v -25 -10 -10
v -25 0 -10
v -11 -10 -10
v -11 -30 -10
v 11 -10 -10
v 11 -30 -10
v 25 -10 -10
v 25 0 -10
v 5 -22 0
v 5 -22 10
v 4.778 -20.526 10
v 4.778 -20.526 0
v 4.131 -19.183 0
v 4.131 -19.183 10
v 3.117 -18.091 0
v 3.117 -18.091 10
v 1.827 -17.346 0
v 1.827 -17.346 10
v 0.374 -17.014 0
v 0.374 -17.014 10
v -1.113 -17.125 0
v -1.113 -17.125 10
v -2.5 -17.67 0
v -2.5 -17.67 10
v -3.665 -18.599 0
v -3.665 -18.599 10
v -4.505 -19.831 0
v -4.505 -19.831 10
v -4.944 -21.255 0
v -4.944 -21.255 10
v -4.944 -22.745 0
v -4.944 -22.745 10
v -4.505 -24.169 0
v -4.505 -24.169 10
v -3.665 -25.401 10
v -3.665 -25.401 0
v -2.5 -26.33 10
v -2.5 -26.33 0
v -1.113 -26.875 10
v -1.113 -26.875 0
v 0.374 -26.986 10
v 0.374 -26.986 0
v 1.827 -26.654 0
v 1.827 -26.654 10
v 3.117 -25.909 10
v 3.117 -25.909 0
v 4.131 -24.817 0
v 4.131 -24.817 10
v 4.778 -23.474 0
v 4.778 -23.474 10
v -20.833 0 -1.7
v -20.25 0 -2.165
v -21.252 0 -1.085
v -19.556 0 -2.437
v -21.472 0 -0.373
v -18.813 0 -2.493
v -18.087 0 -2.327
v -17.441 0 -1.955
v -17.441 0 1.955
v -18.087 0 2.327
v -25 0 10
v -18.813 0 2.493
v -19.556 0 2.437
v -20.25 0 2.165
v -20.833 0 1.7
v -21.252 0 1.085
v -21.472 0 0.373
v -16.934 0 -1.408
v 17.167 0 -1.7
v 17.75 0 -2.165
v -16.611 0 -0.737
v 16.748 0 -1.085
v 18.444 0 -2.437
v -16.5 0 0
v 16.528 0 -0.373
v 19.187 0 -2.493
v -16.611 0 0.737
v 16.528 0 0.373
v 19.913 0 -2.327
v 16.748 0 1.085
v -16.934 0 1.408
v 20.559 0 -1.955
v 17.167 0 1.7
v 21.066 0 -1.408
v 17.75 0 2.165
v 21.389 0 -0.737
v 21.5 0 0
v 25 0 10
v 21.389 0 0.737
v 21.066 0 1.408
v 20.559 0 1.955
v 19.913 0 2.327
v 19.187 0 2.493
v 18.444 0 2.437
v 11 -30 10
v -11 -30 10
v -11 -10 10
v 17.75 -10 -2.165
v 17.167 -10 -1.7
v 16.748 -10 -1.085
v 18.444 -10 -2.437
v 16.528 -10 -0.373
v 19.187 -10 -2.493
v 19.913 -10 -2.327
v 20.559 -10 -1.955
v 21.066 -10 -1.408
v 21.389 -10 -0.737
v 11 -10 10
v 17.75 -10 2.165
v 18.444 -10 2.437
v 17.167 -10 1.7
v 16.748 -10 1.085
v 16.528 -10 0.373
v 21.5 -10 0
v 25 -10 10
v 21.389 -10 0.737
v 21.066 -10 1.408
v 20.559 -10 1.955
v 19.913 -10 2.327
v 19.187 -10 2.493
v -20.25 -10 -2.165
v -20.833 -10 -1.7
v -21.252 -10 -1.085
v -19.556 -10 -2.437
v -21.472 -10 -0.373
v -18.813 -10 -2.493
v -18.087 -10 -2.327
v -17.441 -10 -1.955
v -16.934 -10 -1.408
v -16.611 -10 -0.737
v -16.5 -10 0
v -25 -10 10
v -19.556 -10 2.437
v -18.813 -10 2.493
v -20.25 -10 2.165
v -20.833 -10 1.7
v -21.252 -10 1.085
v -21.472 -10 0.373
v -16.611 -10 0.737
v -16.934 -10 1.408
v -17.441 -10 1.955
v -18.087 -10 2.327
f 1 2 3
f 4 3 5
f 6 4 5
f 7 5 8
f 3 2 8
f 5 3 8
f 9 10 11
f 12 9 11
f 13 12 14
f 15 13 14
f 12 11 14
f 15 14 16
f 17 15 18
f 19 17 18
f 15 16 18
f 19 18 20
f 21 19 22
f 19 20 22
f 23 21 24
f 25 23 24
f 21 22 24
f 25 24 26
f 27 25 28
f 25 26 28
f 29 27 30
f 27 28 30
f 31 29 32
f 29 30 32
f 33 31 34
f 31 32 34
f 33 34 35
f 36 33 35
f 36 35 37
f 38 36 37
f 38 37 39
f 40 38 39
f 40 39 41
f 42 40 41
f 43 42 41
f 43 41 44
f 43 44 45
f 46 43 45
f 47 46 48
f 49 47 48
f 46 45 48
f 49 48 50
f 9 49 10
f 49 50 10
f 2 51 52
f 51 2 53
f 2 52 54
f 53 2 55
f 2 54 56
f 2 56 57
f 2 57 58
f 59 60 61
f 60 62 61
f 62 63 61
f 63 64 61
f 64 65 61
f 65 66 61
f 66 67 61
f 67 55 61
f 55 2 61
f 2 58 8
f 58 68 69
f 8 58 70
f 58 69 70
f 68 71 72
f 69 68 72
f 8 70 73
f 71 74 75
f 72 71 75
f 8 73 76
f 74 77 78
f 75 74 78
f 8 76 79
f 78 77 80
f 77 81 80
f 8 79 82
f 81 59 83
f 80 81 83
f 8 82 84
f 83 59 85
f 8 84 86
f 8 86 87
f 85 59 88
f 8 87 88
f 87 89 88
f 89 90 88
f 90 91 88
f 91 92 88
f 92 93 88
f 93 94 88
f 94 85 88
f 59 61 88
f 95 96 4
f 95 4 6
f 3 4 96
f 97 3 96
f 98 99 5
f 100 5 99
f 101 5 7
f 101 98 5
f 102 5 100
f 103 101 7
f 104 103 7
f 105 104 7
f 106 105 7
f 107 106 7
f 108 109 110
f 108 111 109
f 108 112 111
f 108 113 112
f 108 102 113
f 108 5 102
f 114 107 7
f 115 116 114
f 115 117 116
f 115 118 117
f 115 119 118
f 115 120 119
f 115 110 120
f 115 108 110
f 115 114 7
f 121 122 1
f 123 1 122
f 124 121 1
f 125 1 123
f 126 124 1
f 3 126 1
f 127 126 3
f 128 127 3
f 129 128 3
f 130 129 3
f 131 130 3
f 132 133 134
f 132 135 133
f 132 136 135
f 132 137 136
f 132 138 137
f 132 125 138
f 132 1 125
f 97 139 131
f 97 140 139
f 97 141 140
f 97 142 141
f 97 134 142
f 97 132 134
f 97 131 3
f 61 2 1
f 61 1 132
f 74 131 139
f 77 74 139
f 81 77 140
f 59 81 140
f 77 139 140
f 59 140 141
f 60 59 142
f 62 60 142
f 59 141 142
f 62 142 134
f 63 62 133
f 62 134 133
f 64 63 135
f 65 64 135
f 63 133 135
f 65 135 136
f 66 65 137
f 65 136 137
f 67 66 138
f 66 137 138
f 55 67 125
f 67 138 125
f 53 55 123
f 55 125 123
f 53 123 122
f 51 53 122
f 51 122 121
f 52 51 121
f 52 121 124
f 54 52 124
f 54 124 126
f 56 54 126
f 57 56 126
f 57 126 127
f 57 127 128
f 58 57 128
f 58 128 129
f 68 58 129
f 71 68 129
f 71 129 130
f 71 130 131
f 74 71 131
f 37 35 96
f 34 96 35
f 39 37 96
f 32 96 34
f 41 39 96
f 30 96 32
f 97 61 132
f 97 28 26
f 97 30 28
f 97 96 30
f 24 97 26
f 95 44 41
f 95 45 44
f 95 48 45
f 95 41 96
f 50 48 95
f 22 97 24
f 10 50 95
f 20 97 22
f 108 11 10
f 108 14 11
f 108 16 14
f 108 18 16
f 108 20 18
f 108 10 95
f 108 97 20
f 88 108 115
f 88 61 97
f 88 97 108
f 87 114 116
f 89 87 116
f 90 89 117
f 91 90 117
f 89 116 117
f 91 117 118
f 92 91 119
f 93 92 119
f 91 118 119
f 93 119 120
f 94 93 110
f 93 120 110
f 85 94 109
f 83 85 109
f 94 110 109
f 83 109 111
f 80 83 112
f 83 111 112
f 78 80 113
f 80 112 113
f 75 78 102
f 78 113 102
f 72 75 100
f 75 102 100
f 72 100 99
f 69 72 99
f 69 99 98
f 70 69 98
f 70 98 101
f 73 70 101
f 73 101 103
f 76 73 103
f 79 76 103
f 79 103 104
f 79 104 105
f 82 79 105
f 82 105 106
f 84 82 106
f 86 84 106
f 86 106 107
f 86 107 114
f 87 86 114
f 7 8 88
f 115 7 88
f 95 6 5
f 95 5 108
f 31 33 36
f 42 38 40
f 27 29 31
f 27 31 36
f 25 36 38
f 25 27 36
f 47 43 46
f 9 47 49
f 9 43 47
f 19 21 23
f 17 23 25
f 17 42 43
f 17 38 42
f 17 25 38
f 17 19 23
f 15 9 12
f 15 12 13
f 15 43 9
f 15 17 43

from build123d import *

# Parameters (mm, degrees)
F0_W     = 50
F0_H     = 20
F1_DEPTH = 30
F2_W     = 14
F2_H     = 20
F3_DEPTH = 20
F4_R     = 5
F5_DEPTH = 10
F6_R     = 2.5
F7_DEPTH = 25


with BuildPart() as f1:
    # F0 (on Front) → F1 (new body)
    with BuildSketch(Plane.XZ):
        Rectangle(F0_W, F0_H)
    extrude(amount=F1_DEPTH)

    # F2 (on face) → F3 (cut)
    with BuildSketch(Plane.XZ.offset(30)):
        with Locations((-18, 0)):
            Rectangle(F2_W, F2_H)
        with Locations((18, 0)):
            Rectangle(F2_W, F2_H)
    extrude(amount=-F3_DEPTH, mode=Mode.SUBTRACT)

    # F4 (on face) → F5 (cut)
    with BuildSketch(Plane.XY.offset(10)):
        with Locations((0, -22)):
            Circle(F4_R)
    extrude(amount=-F5_DEPTH, mode=Mode.SUBTRACT)

    # F6 (on face) → F7 (cut)
    with BuildSketch(Plane.XZ.offset(10)):
        with Locations((-19, 0)):
            Circle(F6_R)
        with Locations((19, 0)):
            Circle(F6_R)
    extrude(amount=-F7_DEPTH, mode=Mode.SUBTRACT)


solid = f1.part
